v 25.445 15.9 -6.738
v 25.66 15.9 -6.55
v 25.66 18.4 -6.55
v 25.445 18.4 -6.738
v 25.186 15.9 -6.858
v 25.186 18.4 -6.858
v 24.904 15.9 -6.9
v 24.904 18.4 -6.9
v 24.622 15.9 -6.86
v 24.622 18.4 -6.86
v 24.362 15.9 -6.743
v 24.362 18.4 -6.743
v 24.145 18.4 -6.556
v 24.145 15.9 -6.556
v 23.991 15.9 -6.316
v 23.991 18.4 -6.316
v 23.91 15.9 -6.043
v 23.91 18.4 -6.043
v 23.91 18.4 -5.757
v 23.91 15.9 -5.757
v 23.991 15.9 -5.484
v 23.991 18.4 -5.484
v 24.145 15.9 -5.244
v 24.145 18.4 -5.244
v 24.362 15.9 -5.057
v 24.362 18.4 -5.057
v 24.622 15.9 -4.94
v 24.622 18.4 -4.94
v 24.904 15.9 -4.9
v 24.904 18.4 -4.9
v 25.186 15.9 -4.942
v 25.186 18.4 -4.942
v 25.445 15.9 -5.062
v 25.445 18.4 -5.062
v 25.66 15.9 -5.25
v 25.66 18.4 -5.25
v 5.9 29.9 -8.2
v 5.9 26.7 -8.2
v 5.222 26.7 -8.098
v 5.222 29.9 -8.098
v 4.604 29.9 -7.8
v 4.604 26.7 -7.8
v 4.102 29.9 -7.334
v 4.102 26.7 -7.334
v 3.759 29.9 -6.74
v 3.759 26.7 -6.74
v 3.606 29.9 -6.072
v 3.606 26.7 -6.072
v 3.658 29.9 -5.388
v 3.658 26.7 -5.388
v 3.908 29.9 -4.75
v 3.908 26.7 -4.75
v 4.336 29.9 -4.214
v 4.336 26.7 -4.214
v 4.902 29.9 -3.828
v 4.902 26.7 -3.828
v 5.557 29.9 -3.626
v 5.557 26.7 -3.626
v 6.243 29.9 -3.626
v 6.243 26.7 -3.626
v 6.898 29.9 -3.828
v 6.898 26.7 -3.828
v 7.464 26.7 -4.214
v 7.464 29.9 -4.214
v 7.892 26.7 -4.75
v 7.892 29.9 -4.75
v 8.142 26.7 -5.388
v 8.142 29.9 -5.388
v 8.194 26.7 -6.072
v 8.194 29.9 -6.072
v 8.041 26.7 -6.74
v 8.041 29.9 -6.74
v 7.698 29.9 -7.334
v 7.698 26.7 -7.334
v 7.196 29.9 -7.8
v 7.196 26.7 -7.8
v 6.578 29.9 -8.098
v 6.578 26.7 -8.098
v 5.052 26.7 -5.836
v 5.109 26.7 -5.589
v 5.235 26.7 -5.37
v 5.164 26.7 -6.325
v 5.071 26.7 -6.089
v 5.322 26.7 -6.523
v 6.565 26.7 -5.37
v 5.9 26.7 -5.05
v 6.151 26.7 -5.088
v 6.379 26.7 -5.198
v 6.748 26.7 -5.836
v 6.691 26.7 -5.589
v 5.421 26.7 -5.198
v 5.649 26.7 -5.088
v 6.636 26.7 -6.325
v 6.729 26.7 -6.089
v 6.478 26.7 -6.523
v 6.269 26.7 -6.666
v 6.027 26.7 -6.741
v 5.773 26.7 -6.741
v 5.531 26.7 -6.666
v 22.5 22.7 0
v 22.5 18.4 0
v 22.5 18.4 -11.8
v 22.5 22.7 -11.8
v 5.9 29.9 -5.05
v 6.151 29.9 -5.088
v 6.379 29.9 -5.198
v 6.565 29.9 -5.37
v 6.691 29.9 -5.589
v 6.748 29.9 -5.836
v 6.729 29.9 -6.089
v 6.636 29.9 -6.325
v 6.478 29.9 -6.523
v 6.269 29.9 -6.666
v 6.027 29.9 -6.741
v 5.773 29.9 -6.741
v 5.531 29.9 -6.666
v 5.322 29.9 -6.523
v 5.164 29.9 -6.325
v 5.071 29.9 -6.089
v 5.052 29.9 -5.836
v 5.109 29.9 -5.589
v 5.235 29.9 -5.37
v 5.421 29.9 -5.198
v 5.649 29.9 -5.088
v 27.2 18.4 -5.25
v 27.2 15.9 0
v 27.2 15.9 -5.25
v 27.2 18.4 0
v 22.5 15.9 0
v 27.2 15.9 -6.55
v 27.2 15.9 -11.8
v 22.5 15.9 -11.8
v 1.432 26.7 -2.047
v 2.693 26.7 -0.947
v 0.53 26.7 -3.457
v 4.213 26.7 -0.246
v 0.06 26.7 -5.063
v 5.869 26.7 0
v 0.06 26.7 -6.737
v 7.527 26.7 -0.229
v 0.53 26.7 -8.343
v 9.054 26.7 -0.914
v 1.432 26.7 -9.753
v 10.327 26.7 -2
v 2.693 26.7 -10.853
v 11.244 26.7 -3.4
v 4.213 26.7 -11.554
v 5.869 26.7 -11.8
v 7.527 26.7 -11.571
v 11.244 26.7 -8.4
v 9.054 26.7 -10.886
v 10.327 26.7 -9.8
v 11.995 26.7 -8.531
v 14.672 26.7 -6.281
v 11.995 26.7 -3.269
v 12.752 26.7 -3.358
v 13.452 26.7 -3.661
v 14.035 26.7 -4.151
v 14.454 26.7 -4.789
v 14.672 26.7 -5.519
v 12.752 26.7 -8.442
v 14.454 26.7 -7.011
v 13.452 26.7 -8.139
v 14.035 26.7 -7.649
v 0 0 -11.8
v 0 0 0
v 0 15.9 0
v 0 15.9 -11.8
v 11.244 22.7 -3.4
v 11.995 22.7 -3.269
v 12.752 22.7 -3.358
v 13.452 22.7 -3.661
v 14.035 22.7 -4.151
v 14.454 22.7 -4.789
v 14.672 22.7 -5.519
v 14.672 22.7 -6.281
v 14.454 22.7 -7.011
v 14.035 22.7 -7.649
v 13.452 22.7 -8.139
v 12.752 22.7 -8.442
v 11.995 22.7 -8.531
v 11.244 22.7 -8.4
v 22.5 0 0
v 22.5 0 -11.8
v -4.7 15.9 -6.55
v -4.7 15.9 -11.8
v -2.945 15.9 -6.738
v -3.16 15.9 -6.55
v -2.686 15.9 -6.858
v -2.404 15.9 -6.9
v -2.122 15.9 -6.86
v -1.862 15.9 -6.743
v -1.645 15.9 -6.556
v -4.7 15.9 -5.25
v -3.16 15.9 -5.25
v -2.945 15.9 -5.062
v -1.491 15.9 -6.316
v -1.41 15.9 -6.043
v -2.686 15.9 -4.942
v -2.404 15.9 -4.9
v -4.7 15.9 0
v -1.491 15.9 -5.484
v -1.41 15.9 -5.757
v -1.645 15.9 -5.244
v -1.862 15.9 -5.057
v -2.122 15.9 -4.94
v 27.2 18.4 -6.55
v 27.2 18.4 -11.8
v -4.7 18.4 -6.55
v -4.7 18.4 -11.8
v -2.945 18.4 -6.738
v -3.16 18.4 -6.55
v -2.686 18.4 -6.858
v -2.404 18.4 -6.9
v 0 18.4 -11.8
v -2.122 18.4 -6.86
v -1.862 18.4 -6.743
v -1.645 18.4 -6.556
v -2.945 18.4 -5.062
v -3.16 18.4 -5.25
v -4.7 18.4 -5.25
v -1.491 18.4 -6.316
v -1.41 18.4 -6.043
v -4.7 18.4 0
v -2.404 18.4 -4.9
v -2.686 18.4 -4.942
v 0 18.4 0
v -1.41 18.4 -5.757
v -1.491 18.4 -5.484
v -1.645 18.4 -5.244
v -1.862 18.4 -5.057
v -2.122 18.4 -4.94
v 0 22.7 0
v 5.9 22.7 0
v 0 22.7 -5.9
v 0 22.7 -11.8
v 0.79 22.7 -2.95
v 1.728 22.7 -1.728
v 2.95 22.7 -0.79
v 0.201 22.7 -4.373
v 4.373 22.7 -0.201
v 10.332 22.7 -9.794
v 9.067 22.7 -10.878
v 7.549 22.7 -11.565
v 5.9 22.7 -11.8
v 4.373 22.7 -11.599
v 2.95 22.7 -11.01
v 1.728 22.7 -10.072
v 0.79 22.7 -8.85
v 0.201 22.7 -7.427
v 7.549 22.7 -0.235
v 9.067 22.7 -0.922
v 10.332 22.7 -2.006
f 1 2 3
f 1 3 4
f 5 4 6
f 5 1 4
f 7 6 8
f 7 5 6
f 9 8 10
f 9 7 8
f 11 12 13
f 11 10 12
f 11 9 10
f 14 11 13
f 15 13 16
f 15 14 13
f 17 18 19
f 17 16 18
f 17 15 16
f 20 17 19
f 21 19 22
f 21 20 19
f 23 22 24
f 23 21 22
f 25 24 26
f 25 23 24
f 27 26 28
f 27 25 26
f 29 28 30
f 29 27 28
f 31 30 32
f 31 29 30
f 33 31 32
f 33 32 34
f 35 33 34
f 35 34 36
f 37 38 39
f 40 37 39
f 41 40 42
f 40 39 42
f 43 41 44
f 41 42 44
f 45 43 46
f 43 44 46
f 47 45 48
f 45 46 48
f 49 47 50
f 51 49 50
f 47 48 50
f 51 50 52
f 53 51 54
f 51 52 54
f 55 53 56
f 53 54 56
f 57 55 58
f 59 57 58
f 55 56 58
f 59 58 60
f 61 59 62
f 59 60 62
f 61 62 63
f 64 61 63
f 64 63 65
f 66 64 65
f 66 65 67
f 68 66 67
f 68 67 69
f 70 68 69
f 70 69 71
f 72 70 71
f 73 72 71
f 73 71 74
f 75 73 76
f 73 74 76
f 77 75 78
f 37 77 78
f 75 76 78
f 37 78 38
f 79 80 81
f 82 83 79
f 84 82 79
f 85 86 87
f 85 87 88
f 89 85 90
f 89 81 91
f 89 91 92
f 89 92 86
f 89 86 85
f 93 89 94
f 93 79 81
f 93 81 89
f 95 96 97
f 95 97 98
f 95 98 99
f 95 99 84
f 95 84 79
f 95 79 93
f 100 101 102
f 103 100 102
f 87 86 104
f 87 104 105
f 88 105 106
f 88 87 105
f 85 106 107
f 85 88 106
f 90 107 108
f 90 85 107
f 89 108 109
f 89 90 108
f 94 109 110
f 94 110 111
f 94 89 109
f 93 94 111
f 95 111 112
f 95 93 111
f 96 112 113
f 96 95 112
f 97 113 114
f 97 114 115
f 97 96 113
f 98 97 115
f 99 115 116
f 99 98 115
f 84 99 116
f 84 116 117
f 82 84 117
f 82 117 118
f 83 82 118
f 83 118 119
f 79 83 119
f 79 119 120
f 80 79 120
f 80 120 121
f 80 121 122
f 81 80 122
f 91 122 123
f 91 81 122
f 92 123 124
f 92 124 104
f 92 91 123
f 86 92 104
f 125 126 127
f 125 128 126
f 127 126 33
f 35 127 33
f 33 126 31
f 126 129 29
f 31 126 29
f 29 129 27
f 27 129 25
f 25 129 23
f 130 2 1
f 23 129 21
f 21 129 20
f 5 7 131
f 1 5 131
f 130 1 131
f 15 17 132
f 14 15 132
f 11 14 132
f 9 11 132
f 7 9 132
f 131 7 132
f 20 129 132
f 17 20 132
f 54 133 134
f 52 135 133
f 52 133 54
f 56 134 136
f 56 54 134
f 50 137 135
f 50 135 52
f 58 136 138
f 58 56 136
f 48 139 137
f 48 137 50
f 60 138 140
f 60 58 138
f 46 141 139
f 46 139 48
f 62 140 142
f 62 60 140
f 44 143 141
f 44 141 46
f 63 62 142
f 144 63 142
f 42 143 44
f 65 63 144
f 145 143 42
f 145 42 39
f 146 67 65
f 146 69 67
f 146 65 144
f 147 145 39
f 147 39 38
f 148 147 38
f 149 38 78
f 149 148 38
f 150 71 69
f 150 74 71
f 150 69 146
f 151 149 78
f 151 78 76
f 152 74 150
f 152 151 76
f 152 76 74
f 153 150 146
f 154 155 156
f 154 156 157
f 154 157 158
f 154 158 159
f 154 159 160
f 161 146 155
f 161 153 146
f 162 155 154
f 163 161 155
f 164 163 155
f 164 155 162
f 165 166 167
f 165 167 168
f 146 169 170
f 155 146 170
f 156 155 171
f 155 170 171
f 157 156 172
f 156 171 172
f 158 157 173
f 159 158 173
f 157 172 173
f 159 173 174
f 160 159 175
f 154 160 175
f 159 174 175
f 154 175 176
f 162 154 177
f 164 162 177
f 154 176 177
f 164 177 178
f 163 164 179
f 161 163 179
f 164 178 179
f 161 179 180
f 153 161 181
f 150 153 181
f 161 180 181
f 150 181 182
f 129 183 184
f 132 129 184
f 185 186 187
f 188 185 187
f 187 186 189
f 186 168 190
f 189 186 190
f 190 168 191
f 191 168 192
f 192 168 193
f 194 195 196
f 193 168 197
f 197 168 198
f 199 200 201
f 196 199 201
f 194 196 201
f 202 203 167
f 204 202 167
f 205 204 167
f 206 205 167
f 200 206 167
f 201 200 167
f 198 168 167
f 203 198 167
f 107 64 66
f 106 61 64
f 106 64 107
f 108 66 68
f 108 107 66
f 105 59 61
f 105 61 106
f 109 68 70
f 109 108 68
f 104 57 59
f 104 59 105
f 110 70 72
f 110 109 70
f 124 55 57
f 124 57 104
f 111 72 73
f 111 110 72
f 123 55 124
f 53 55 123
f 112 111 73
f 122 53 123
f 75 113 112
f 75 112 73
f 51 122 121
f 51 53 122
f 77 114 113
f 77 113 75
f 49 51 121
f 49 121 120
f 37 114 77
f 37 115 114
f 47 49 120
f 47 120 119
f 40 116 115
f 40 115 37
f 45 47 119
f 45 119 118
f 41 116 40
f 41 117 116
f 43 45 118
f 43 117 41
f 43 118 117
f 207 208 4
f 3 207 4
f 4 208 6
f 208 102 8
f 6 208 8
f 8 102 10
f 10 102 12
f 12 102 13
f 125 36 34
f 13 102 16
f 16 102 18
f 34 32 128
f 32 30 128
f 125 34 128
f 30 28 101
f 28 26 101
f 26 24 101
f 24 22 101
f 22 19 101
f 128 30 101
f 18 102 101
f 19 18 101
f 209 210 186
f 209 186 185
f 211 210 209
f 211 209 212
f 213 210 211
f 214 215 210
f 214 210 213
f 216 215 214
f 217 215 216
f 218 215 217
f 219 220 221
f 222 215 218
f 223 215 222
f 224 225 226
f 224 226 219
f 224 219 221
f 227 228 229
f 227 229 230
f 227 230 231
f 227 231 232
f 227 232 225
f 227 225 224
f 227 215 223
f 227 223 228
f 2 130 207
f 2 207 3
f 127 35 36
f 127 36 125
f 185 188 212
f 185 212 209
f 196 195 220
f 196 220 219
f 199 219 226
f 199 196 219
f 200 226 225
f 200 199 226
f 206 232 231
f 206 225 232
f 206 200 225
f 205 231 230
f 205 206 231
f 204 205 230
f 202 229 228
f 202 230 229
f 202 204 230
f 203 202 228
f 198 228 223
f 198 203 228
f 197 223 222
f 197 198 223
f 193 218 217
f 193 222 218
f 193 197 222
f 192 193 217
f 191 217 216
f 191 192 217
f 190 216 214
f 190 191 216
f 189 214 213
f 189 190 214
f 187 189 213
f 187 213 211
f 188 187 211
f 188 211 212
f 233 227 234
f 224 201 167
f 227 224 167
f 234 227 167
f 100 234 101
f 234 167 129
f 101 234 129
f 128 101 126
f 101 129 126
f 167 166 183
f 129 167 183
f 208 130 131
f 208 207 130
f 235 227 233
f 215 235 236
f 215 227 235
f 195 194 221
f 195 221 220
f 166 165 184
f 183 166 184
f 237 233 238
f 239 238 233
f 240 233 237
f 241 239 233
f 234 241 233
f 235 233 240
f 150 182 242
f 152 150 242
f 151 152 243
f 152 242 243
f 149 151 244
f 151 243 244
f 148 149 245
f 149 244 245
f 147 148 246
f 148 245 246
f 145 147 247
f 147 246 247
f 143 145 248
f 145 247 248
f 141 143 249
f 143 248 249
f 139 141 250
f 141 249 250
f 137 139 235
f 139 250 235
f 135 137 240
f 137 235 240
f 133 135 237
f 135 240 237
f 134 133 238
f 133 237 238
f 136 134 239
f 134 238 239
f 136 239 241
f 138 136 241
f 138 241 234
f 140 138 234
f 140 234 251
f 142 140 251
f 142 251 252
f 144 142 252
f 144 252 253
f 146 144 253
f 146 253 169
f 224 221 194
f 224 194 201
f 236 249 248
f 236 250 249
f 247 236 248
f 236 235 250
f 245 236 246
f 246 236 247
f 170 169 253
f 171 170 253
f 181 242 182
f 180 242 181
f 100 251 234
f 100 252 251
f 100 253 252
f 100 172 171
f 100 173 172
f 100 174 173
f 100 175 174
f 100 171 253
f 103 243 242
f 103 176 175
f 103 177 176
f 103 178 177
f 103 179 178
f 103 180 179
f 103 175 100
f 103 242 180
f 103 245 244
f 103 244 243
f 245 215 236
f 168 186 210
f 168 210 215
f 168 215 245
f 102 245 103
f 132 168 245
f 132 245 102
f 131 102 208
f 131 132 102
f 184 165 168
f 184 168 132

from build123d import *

# Parameters (mm, degrees)
ESBO_O1_W                  = 22.5
ESBO_O1_H                  = 11.8
RESSALTO_EXTRUS_O1_DEPTH   = 22.7
ESBO_O2_W                  = 11.8
ESBO_O2_H                  = 2.5
RESSALTO_EXTRUS_O2_DEPTH   = 4.7
RESSALTO_EXTRUS_O3_DEPTH   = 4.7
RESSALTO_EXTRUS_O4_DEPTH   = 4
ESBO_O5_R                  = 2.3
ESBO_O5_R_2                = 0.85
RESSALTO_EXTRUS_O5_DEPTH   = 3.2
CORTE_EXTRUS_O1_DEPTH      = 35.894698738
CORTE_EXTRUS_O1_DEPTH_BACK = 3.2
CORTE_EXTRUS_O2_DEPTH      = 35.894698738
CORTE_EXTRUS_O2_DEPTH_BACK = 3.2


with BuildPart() as part:
    # Esboço1 → Ressalto-extrusão1 (new body)
    with BuildSketch(Plane(origin=(0, 0, 0), x_dir=(1, 0, 0), z_dir=(0, 1, 0))):
        with Locations((11.25, 5.9)):
            Rectangle(ESBO_O1_W, ESBO_O1_H)
    extrude(amount=RESSALTO_EXTRUS_O1_DEPTH)

    # Esboço2 → Ressalto-extrusão2 (add)
    with BuildSketch(Plane.ZY):
        with Locations((-5.9, 17.15)):
            Rectangle(ESBO_O2_W, ESBO_O2_H)
    extrude(amount=RESSALTO_EXTRUS_O2_DEPTH)

    # Esboço3 → Ressalto-extrusão3 (add)
    with BuildSketch(Plane(origin=(22.5, 0, 0), x_dir=(0, 0, -1), z_dir=(1, 0, 0))):
        Polygon((5.9, 15.9), (11.8, 15.9), (11.8, 18.4), (0, 18.4), (0, 15.9), align=None)
    extrude(amount=RESSALTO_EXTRUS_O3_DEPTH)

    # Esboço4 → Ressalto-extrusão4 (add)
    with BuildSketch(Plane(origin=(0, 22.7, 0), x_dir=(1, 0, 0), z_dir=(0, 1, 0))):
        with BuildLine():
            ThreePointArc((11.244155686, 8.4), (0, 5.9), (11.244155686, 3.4))
            ThreePointArc((11.244155686, 3.4), (14.7, 5.9), (11.244155686, 8.4))
        make_face()
    extrude(amount=RESSALTO_EXTRUS_O4_DEPTH)

    # Esboço5 → Ressalto-extrusão5 (add)
    with BuildSketch(Plane(origin=(0, 26.7, 0), x_dir=(1, 0, 0), z_dir=(0, 1, 0))):
        with Locations(Location((5.9, 5.9, 0), (0, 0, 90))):
            Circle(ESBO_O5_R)
        with Locations(Location((5.9, 5.9, 0), (0, 0, 270))):
            Circle(ESBO_O5_R_2, mode=Mode.SUBTRACT)
    extrude(amount=RESSALTO_EXTRUS_O5_DEPTH)

    # Esboço6 → Corte-extrusão1 (cut, two sides: drawn at the far end of the back side and taken through both)
    with BuildSketch(Plane(origin=(0, 18.4, 0), x_dir=(1, 0, 0), z_dir=(0, 1, 0)).offset(-CORTE_EXTRUS_O1_DEPTH_BACK)):
        with BuildLine():
            Line((-3.159934208, 6.55), (-4.7, 6.55))
            Line((-4.7, 6.55), (-4.7, 5.25))
            Line((-4.7, 5.25), (-3.159934208, 5.25))
            ThreePointArc((-3.159934208, 5.25), (-1.4, 5.9), (-3.159934208, 6.55))
        make_face()
    extrude(amount=CORTE_EXTRUS_O1_DEPTH + CORTE_EXTRUS_O1_DEPTH_BACK, mode=Mode.SUBTRACT)

    # Esboço7 → Corte-extrusão2 (cut, two sides: drawn at the far end of the back side and taken through both)
    with BuildSketch(Plane(origin=(0, 18.4, 0), x_dir=(1, 0, 0), z_dir=(0, 1, 0)).offset(-CORTE_EXTRUS_O2_DEPTH_BACK)):
        with BuildLine():
            Line((25.659934208, 5.25), (27.2, 5.25))
            Line((27.2, 5.25), (27.2, 6.55))
            Line((27.2, 6.55), (25.659934208, 6.55))
            ThreePointArc((25.659934208, 6.55), (23.9, 5.9), (25.659934208, 5.25))
        make_face()
    extrude(amount=CORTE_EXTRUS_O2_DEPTH + CORTE_EXTRUS_O2_DEPTH_BACK, mode=Mode.SUBTRACT)


solid = part.part
